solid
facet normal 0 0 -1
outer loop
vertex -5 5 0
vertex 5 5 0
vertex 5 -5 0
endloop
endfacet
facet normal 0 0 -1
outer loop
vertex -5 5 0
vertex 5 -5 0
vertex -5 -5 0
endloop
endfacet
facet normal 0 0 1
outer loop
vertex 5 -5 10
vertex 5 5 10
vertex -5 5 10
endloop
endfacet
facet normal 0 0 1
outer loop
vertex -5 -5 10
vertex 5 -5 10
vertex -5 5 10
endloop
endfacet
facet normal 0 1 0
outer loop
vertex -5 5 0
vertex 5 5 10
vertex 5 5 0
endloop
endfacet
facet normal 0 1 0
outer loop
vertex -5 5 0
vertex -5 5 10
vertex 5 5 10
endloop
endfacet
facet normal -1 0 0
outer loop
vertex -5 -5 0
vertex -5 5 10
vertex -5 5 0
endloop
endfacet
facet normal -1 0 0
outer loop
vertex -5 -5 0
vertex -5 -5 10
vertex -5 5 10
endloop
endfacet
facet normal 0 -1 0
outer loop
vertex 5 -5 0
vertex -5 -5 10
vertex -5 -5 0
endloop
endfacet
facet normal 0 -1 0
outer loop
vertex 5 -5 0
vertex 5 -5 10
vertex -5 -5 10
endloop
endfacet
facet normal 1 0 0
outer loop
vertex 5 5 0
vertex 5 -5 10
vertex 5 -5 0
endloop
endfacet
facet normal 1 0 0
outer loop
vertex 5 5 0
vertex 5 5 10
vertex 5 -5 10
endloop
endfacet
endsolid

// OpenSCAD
linear_extrude(height = 10.0, twist = 0.0, scale = 1.0, slices = 1, center = false)
{
    scale([10.0, 10.0])
    {
        M8();
    }
}

module M8()
{
    polygon
    (
        points =
        [
            [-0.5, -0.5], 
            [0.5, -0.5], 
            [0.5, 0.5], 
            [-0.5, 0.5]
        ],
        paths =
        [
            [0, 1, 2, 3]
        ]
    );
}
